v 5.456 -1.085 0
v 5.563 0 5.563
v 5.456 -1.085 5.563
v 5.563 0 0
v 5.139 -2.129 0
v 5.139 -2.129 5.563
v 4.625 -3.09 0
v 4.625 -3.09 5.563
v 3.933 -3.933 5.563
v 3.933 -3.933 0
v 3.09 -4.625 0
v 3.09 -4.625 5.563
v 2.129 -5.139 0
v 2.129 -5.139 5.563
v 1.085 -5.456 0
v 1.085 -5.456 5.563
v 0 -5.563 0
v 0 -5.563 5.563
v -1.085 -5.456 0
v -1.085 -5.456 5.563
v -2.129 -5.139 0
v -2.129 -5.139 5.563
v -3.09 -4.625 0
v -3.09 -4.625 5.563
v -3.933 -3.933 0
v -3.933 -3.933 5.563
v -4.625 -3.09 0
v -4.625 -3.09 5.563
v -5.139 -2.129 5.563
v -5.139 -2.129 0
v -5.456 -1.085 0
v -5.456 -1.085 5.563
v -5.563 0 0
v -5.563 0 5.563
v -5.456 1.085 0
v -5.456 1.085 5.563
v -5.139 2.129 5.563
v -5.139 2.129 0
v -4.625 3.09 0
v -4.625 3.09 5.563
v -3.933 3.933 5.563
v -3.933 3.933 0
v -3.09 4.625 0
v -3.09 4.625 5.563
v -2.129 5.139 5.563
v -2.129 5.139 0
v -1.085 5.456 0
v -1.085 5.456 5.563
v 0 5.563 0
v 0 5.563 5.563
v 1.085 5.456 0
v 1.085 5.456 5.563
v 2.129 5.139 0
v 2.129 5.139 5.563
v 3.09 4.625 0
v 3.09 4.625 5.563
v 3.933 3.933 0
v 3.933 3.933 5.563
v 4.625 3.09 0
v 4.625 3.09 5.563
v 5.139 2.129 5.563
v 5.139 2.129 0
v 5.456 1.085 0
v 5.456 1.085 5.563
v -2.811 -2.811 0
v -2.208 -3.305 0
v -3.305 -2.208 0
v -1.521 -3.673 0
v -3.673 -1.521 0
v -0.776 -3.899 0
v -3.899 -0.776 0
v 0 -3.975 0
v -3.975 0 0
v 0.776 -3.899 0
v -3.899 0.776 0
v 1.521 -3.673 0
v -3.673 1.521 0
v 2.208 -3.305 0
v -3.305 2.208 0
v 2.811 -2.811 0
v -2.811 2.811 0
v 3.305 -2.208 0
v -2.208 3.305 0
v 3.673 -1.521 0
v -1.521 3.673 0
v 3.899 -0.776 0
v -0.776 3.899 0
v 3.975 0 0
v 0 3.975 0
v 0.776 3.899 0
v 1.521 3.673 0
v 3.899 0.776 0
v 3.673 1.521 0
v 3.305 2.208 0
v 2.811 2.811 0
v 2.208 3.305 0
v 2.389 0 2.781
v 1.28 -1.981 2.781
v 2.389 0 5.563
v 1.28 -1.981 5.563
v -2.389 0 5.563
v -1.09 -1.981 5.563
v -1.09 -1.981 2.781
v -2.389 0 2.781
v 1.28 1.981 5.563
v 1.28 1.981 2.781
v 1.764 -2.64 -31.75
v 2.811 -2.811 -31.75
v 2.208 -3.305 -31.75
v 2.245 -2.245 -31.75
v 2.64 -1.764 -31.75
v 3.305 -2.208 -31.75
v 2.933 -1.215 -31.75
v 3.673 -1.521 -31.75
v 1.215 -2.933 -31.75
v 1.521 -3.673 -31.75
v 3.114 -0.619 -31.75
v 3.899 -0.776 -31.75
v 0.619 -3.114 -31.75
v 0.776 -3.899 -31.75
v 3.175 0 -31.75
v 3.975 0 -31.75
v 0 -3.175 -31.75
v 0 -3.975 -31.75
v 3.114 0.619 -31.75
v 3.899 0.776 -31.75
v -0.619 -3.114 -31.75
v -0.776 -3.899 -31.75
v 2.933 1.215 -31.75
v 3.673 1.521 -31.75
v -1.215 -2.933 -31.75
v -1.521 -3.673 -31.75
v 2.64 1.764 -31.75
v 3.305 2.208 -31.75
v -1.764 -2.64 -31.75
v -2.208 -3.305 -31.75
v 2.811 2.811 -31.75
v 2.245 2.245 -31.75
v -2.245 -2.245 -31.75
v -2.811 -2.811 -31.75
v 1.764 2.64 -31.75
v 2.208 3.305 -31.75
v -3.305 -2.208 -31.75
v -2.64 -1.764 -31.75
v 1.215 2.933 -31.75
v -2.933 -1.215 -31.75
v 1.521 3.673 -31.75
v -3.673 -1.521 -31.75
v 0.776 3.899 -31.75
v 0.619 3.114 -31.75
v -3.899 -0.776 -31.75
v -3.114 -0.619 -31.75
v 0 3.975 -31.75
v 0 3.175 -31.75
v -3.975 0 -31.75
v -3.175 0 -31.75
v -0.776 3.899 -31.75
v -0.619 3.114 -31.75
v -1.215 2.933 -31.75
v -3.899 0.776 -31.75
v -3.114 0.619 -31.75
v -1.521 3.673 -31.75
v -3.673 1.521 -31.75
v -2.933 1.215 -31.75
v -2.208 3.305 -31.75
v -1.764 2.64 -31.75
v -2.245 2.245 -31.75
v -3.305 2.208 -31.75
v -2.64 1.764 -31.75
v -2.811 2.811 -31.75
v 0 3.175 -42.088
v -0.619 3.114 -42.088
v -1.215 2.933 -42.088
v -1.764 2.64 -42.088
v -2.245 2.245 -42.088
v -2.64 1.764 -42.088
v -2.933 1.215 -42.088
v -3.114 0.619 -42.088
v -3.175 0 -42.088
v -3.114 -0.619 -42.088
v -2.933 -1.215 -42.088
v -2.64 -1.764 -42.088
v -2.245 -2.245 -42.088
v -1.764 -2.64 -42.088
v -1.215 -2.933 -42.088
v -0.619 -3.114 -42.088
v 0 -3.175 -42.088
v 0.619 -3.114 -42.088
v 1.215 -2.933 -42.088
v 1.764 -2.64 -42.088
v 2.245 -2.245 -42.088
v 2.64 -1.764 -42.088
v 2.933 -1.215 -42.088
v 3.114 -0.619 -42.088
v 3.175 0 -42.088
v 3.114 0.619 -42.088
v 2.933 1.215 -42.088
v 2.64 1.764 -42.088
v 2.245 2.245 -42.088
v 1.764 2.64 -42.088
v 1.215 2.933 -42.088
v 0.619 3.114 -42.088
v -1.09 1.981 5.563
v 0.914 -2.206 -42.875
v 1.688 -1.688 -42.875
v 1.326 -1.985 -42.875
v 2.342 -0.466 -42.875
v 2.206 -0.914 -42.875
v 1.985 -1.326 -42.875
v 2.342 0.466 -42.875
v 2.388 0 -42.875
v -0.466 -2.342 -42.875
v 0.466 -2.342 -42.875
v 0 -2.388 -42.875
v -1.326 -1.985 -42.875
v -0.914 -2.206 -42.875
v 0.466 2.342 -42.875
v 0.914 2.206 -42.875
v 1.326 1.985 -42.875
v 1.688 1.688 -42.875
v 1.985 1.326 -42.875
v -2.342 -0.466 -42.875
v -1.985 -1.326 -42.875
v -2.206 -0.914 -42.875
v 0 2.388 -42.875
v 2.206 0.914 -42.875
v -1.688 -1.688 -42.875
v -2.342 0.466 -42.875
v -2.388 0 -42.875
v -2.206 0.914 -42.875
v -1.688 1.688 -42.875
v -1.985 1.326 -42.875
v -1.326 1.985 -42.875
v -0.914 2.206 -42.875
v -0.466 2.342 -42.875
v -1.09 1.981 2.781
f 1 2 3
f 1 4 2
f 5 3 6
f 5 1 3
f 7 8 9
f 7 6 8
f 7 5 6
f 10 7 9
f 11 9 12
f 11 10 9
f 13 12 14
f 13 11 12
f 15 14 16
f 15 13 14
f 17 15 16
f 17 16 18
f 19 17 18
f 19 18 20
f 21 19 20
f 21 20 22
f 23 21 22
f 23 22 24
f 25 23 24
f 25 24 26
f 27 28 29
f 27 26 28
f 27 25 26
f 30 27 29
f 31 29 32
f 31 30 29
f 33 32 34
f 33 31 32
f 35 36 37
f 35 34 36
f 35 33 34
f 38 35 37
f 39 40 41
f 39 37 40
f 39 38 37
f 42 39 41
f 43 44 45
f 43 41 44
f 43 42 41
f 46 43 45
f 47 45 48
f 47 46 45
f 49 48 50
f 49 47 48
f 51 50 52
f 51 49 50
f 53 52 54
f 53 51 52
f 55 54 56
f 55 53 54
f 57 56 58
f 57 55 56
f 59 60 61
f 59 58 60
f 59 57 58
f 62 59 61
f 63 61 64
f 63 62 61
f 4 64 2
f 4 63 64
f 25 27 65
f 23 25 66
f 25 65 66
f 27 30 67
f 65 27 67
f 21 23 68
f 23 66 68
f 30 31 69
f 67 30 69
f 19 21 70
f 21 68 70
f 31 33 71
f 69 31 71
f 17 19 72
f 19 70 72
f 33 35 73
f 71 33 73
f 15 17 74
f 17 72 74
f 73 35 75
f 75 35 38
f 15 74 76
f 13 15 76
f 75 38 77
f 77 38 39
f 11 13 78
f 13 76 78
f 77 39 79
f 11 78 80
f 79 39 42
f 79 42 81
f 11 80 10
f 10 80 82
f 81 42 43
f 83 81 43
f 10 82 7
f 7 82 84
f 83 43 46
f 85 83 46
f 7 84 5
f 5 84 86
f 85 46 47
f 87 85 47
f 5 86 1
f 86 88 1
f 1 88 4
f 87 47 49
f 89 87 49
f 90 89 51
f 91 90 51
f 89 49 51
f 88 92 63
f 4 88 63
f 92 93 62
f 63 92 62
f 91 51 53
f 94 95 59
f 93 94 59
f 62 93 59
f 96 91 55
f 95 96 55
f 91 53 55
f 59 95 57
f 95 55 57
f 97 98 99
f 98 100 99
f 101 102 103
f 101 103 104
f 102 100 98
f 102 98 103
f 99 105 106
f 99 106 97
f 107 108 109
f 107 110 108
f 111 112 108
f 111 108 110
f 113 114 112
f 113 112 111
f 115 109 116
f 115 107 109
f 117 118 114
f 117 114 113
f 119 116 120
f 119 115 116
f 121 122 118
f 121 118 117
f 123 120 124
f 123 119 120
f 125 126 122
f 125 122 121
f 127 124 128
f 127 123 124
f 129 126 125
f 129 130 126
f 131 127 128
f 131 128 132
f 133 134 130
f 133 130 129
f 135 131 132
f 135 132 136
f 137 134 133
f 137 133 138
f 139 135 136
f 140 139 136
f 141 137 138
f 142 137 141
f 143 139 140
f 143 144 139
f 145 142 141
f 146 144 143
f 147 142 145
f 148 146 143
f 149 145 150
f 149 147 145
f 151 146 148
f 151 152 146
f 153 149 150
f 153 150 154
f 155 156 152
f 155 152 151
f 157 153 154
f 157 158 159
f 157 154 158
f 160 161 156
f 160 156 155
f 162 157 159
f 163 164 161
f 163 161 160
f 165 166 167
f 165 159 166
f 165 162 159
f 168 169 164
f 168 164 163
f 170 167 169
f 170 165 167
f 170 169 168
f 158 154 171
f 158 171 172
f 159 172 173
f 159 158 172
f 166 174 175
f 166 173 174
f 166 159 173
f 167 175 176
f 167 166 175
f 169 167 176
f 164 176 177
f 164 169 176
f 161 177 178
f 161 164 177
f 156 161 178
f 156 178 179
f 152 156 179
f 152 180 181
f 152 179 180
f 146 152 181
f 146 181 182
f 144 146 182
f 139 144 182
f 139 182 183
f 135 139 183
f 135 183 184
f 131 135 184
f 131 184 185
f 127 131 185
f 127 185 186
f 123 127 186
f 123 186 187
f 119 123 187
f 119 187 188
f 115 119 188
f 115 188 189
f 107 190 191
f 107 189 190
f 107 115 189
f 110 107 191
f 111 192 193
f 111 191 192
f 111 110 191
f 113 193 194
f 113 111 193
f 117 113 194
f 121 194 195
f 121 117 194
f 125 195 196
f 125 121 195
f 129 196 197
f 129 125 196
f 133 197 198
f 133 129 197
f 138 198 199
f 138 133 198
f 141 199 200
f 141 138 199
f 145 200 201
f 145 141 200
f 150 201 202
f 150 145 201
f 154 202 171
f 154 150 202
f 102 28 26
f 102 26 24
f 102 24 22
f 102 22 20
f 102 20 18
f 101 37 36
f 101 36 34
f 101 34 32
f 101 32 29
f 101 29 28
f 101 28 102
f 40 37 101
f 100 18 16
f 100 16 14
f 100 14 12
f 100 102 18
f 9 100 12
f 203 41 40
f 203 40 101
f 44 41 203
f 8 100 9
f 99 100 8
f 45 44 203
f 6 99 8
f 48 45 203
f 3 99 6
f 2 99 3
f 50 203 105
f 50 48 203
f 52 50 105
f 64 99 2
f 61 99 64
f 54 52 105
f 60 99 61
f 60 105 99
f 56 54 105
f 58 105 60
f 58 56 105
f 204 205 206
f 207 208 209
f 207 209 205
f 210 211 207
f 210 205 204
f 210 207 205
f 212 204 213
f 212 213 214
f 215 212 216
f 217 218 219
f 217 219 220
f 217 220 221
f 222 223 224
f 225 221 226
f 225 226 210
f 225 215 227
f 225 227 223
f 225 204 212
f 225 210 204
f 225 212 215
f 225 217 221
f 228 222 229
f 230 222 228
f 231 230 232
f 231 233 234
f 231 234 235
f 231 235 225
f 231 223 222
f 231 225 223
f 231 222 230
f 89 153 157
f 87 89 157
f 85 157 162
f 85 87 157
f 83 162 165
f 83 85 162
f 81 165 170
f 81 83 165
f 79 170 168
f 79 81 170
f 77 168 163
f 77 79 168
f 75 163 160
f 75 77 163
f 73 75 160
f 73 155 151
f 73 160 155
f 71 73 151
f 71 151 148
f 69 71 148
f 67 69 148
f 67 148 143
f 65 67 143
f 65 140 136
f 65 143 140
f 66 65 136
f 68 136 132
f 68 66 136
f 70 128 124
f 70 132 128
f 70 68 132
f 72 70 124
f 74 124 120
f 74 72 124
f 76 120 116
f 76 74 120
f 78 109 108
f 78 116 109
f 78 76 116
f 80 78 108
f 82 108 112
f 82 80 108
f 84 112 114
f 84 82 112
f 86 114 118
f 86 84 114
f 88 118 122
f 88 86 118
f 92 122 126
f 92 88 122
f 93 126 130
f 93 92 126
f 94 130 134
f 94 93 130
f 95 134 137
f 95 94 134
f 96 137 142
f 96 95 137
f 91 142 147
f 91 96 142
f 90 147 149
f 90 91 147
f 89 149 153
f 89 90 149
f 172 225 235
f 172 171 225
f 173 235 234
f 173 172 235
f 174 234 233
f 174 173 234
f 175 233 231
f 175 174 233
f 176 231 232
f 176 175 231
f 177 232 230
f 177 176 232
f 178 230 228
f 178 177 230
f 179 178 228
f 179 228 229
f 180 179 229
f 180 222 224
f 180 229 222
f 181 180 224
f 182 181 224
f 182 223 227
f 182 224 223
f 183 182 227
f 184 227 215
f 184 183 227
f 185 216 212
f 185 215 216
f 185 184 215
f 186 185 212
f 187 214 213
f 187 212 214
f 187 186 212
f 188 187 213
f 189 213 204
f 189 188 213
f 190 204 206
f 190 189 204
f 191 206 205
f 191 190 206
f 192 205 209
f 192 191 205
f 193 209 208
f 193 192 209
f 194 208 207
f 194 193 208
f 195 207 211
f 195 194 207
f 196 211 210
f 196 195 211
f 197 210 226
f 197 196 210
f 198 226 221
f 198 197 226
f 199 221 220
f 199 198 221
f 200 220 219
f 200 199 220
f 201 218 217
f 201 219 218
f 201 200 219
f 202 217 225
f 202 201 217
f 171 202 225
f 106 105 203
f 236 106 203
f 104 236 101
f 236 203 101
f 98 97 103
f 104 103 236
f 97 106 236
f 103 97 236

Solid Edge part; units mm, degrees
sketch "Sketch1" plane through (0, 0, 0) normal (0, 0, 1) x (1, 0, 0)
  circle A0 centre (0, 0) radius 5.5626
  dimension "D1" = 11.1252
extrude "Protrusion1" add sketch "Sketch1" along normal blind 5.5626
sketch "Sketch2" plane through (0, 0, 0) normal (0, 0, -1) x (0, 1, 0)
  circle A0 centre (0, 0) radius 3.9751
  dimension "D1" = 7.9502
extrude "Protrusion2" add sketch "Sketch2" along normal blind 31.75
sketch "Sketch3" plane through (0, 0, -31.75) normal (0, 0, -1) x (0, 1, 0)
  circle A0 centre (0, 0) radius 3.175
  dimension "D1" = 6.35
extrude "Protrusion3" add sketch "Sketch3" along normal blind 11.1252
sketch "Sketch4" plane through (0, 0, 5.5626) normal (0, 0, 1) x (0, 1, 0)
  line L0 (-1.9812, 1.0896) -> (0, 2.3891)
  line L1 (-1.9812, -1.2798) -> (-1.9812, 1.0896)
  line L2 (-1.9812, -1.2798) -> (0, -2.3891)
  line L3 (1.9812, -1.2798) -> (0, -2.3891)
  line L4 (1.9812, -1.2798) -> (1.9812, 1.0896)
  line L5 (1.9812, 1.0896) -> (0, 2.3891)
  dimension "D1" = 3.9624
extrude "Cutout1" cut sketch "Sketch4" against normal blind 2.7813
chamfer "Chamfer1" distance 0.7874 angle 45 1 edges at (0, -3.175, -42.8752)
properties part number "24101950"
